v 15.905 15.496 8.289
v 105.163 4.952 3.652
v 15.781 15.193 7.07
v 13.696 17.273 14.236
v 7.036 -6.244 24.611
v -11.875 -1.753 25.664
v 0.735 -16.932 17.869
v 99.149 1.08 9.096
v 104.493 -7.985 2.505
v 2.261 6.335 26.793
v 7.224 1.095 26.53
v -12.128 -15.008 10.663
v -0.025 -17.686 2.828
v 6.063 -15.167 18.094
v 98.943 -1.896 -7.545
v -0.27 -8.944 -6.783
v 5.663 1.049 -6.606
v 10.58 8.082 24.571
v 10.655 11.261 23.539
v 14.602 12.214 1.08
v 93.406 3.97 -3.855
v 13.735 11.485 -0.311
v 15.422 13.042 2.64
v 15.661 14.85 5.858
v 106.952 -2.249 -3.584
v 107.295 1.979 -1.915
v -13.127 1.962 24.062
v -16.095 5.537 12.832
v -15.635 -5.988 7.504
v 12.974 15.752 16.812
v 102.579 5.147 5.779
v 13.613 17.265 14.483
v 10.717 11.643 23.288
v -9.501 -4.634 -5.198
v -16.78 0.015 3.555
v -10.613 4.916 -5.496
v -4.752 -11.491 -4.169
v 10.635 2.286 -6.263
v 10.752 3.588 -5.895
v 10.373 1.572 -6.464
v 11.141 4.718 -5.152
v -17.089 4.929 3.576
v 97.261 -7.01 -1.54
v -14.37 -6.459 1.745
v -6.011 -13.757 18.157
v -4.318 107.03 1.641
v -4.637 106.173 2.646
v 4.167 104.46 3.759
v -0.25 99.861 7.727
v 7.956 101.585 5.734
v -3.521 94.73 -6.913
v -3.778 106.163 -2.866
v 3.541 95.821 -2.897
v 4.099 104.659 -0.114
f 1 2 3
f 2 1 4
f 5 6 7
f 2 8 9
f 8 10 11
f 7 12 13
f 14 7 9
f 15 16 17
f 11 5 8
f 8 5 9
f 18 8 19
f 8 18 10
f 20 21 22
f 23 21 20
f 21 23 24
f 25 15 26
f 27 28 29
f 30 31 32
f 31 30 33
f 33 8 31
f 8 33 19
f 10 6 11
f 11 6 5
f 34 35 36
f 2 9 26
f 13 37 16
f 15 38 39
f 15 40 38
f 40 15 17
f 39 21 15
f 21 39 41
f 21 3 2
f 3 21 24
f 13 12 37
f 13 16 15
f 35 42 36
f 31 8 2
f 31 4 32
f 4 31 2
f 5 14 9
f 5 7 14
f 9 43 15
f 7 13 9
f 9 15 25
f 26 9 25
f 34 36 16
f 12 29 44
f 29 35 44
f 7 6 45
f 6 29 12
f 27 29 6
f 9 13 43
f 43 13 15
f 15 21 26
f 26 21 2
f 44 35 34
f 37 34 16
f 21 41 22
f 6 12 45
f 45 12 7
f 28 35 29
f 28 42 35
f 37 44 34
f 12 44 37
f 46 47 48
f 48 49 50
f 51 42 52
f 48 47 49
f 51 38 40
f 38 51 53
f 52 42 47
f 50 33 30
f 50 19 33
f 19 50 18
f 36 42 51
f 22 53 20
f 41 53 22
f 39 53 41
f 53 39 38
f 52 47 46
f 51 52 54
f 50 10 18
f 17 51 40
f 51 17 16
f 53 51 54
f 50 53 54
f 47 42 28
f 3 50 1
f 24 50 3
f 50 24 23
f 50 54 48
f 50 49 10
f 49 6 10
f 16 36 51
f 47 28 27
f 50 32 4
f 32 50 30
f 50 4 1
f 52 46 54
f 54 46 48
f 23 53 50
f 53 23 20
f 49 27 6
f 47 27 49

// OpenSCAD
include <hull.scad>;
cloud1=pointInSphere([100,0,0],10);
cloud2=pointInSphere([0,0,10],20,159);
 cloud3=pointInSphere([0,100,0],10);
 cloud12=concat(cloud1,cloud2);
 cloud23=concat(cloud2,cloud3);
 
  cloud(cloud12);
  cloud(cloud23);
// 
//a= ([ cloud12,hull(cloud12)]);
//b= ([ cloud23,hull(cloud23)]);
// 
// 
//
// 
////b1=translateMesh(a,[rnd(-10,10),rnd(-10,10),rnd(-10,10)]);
////b=scaleMesh(b1,rnd(0.5,2));
//  p=concat(cutPoints(b,a),cutPoints(a,b));
// 
//ap=concat (a[0],p);
//bp=concat (b[0],p);
//
//af= ([ ap,hull(ap)]);
//bf= ([ bp,hull(bp)]);
// 
// polyhedron(a[0],a[1]);
// polyhedron(b[0],b[1]);
// 
// for(i=p)translate(i)sphere(.5);
//  color("blue"){
//  for(i=a[0])translate(i)sphere(.5);
// for(i=b[0])translate(i)sphere(.5);
// }

module cloud(p)
{
    hull()    polyhedron(p,[[each[0:len(p)-1]]]);
    }

 function cutPoints(polyhedra1,polyhedra2)=
 let(
 edges1=getEdges(polyhedra1),
 faces1=getFaces(polyhedra2)
 )
 [for(f=faces1)  for(e=edges1) 
  let(  res=  pointOfItersection(f,e)  )  if(res!=[])
//      echo(str("     ", e,"  ",res  ))
      res ]
 
 
 ;
function wrap(x,x_max=1,x_min=0) =

 (((x - x_min) % (x_max - x_min)) + (x_max - x_min)) % (x_max - x_min) + x_min; // wraps numbers 

function getEdges(polyhedra)=
let( points=polyhedra[0],faces=polyhedra[1])
 
[for(f=faces)let(l=len(f)-1)for( p=[0:l]) [points[f[p]],points[f[wrap(p+1,l)]]]   ]
;
function getFaces(polyhedra)=
let( points=polyhedra[0],faces=polyhedra[1])
[for(f=faces) [for(p=f) points[p]  ]  ]

;
function getMesh (soup)=
[[for(i=soup) each[i[0],i[1],i[2]]  ],

[for(i=[0:3:(len(soup)-1)*3])[i,i+1,i+2] ]
    ]

;
 function getpoints(soup)=unique([for(i=soup,j=i)j]);

//function doesIntersect (face,line)=
//!is_list(face)||!is_list(line)?false:
// len(face) !=4|| len (line)!=3?false:
//
//let (
////e=echo(len(face),len(line)),
// 
////intersectPlane= sign(distanceFromPlane (face,line[0])) != sign(distanceFromPlane (face,line[1])) ,
//insideAB=0>sign(distanceFromPlane ([line[0],face[0],face[1]],line[1])),
//insideBC=0>sign(distanceFromPlane ([line[0],face[1],face[2]],line[1])),
//insideCA=0>sign(distanceFromPlane ([line[0],face[2],face[0]],line[1])))
//// intersectPlane&&
//insideAB&&insideBC&&insideCA 
// 
//;


function pointOfItersection (face,line)=
let(
p0=line[0],
p1=line[1],
 
d0= distanceFromFace (face,p0),

d1=distanceFromFace (face,p1)
)
 sign(d0) == sign(d1)? []: 
 let(
insideAB= sign(distanceFromFace ([p0,face[0],face[1]],p1)) >=0,
insideBC= sign(distanceFromFace ([p0,face[1],face[2]],p1))>=0,
insideCA= sign(distanceFromFace ([p0,face[2],face[0]],p1))>=0
)
insideAB||insideBC||insideCA?[]:
 
let (
 
l=abs(d0)+abs(d1),

 
f= abs(d0)/l,
P= lerp(p0,p1,f)
)
 P
 ;

 

function dot(a,b)=a*b;


function distanceFromFace(face,vertex)=
let( N=faceNormal(face), P= face[0] )
dot (N,vertex-P)
;
function faceNormal(v)= len(v)>3?un(faceNormal([v[0],v[1],v[2]])
+faceNormal(concat([v[0]],[for(i=[2:len(v)-1])v[i]]))):
    let(u=v[0]-v[1],w=v[0]-v[2] 
)
un( cross(u,w));
function p2n(pa, pb, pc) =
let (u = pa - pb, v = pa - pc) un([u[1] * v[2] - u[2] * v[1], u[2] *
v[0] - u[0] * v[2], u[0] * v[1] - u[1] * v[0]
]);

 function  projectPoint2plane(p,o,n) =  p-n* dot (p-o,n); 

function v3(p) = [p.x, p.y, p.z]; // vec3 formatter
// polyline plotter
module line(p1, p2 ,width=0.5) 
{ // single line plotter
hull() {
translate(p1) sphere(width);
translate(p2) sphere(width);
}
}
function rnd(a = 1, b = 0, s = []) = 
s == [] ? 
(rands(min(a, b), max(   a, b), 1)[0]) 
: 
(rands(min(a, b), max(a, b), 1, s)[0])
; 
function rndc(a=1,b=0)=[rnd(a,b),rnd(a,b),rnd(a,b)];
function lerp(start, end, bias) = (end * bias + start * (1 - bias));
function dot(a,b)=a*b;
function heron(a, b, c) =
let (s = (a + b + c) / 2) sqrt(abs(s * (s - a) * (s - b) * (s - c)));
function polyarea(p1, p2, p3) = heron(norm(p1 - p2), norm(p2 - p3), len3(p2 - p1));
function un(v)=is_list(v)? v/max( is_undef(norm(v))?0:norm(v),1e-16):v;

//function avrg(l) = len(l) > 1 ? addl(l) / (len(l)) : l;

function avrgp(l) = len(l) > 1 ? addlp(l) / (len(l)) : l;

 function addlp(v, i=0, r=[0,0,0]) = i<len(v) ? addlp(v, i+1, r+v[i]) : r;

function translateMesh (mesh,T)= [[for (vx=mesh[0])vx+T],mesh[1]];
function scaleMesh (mesh,s)= [  mesh[0] *s,mesh[1]];

function pointInSphere(p,r,n=30)=
let(rsq=r*r)[
for(i=[0:n])
    let(v=[rnd(-r,r),rnd(-r,r),rnd(-r,r)])
if((v.x*v.x+v.y*v.y+v.z*v.z)<rsq)v+p ];




function glue(points,faces)=
faces==undef?glue(points[0],points[1]):
    let( usedpoints=([for(i=faces,j=i)points[j]]),

upoints=truepoints(unique(points)),
nfaces= [for(i=faces)[for(j=i)
    search([points[j]],upoints,1)[0]]])
[upoints,nfaces];

function truepoints(p)=[for(i=p)if(i!=undef)i];

function  uniquejoin(m,n) =  
    concat(m,[   for (i = n)    if (search([i],m,1)==[[]]) i  ]);

//function  unique(m) = [   for (i = [0: len(m) - 1])    if (search([m[i]],m,1)==[i]) m[i] ];

function  unique(m,first,last) = last==undef?unique(m,0,len(m)-1) :
last-first>1? let(mid=(first+last)/2)
uniquejoin(  unique(m,first,floor(mid)),         unique(m,ceil(mid),last) )
 :m[first]==undef? [m[last]]: m[last]==undef?[m[first]] :concat([m[first]],[if( m[last]!=m[first])m[last]] ) ;

function cubemesh3() = [
[
[-10, -10, -10],
[10, -10, -10],
[10, 10, -10],
[-10, 10, -10],
[-10, -10, -10],
[10, -10, -10],
[10, -10, 10],
[-10, -10, 10],
[10, -10, -10],
[10, 10, -10],
[10, 10, 10],
[10, -10, 10],
[10, 10, -10],
[-10, 10, -10],
[-10, 10, 10],
[10, 10, 10],
[-10, 10, -10],
[-10, -10, -10],
[-10, -10, 10],
[-10, 10, 10],
[-10, -10, 10],
[10, -10, 10],
[10, 10, 10],
[-10, 10, 10]
],
[
//     [0, 1, 2, 3],
//     [7, 6, 5, 4],
//     [11, 10, 9, 8],
//     [15, 14, 13, 12],
//     [19, 18, 17, 16],
//    [23, 22, 21, 20]


[0, 1, 2],
[0,  2, 3]
,
[7, 6, 5],
[7,  5, 4],
[11, 10, 9],
[11, , 9, 8],
[15, 14, 13],
[15,  13, 12],
[19, 18, 17],
[19,  17, 16]
 ,    [23, 22, 21]
 ,    [23,  21, 20]

]
];
